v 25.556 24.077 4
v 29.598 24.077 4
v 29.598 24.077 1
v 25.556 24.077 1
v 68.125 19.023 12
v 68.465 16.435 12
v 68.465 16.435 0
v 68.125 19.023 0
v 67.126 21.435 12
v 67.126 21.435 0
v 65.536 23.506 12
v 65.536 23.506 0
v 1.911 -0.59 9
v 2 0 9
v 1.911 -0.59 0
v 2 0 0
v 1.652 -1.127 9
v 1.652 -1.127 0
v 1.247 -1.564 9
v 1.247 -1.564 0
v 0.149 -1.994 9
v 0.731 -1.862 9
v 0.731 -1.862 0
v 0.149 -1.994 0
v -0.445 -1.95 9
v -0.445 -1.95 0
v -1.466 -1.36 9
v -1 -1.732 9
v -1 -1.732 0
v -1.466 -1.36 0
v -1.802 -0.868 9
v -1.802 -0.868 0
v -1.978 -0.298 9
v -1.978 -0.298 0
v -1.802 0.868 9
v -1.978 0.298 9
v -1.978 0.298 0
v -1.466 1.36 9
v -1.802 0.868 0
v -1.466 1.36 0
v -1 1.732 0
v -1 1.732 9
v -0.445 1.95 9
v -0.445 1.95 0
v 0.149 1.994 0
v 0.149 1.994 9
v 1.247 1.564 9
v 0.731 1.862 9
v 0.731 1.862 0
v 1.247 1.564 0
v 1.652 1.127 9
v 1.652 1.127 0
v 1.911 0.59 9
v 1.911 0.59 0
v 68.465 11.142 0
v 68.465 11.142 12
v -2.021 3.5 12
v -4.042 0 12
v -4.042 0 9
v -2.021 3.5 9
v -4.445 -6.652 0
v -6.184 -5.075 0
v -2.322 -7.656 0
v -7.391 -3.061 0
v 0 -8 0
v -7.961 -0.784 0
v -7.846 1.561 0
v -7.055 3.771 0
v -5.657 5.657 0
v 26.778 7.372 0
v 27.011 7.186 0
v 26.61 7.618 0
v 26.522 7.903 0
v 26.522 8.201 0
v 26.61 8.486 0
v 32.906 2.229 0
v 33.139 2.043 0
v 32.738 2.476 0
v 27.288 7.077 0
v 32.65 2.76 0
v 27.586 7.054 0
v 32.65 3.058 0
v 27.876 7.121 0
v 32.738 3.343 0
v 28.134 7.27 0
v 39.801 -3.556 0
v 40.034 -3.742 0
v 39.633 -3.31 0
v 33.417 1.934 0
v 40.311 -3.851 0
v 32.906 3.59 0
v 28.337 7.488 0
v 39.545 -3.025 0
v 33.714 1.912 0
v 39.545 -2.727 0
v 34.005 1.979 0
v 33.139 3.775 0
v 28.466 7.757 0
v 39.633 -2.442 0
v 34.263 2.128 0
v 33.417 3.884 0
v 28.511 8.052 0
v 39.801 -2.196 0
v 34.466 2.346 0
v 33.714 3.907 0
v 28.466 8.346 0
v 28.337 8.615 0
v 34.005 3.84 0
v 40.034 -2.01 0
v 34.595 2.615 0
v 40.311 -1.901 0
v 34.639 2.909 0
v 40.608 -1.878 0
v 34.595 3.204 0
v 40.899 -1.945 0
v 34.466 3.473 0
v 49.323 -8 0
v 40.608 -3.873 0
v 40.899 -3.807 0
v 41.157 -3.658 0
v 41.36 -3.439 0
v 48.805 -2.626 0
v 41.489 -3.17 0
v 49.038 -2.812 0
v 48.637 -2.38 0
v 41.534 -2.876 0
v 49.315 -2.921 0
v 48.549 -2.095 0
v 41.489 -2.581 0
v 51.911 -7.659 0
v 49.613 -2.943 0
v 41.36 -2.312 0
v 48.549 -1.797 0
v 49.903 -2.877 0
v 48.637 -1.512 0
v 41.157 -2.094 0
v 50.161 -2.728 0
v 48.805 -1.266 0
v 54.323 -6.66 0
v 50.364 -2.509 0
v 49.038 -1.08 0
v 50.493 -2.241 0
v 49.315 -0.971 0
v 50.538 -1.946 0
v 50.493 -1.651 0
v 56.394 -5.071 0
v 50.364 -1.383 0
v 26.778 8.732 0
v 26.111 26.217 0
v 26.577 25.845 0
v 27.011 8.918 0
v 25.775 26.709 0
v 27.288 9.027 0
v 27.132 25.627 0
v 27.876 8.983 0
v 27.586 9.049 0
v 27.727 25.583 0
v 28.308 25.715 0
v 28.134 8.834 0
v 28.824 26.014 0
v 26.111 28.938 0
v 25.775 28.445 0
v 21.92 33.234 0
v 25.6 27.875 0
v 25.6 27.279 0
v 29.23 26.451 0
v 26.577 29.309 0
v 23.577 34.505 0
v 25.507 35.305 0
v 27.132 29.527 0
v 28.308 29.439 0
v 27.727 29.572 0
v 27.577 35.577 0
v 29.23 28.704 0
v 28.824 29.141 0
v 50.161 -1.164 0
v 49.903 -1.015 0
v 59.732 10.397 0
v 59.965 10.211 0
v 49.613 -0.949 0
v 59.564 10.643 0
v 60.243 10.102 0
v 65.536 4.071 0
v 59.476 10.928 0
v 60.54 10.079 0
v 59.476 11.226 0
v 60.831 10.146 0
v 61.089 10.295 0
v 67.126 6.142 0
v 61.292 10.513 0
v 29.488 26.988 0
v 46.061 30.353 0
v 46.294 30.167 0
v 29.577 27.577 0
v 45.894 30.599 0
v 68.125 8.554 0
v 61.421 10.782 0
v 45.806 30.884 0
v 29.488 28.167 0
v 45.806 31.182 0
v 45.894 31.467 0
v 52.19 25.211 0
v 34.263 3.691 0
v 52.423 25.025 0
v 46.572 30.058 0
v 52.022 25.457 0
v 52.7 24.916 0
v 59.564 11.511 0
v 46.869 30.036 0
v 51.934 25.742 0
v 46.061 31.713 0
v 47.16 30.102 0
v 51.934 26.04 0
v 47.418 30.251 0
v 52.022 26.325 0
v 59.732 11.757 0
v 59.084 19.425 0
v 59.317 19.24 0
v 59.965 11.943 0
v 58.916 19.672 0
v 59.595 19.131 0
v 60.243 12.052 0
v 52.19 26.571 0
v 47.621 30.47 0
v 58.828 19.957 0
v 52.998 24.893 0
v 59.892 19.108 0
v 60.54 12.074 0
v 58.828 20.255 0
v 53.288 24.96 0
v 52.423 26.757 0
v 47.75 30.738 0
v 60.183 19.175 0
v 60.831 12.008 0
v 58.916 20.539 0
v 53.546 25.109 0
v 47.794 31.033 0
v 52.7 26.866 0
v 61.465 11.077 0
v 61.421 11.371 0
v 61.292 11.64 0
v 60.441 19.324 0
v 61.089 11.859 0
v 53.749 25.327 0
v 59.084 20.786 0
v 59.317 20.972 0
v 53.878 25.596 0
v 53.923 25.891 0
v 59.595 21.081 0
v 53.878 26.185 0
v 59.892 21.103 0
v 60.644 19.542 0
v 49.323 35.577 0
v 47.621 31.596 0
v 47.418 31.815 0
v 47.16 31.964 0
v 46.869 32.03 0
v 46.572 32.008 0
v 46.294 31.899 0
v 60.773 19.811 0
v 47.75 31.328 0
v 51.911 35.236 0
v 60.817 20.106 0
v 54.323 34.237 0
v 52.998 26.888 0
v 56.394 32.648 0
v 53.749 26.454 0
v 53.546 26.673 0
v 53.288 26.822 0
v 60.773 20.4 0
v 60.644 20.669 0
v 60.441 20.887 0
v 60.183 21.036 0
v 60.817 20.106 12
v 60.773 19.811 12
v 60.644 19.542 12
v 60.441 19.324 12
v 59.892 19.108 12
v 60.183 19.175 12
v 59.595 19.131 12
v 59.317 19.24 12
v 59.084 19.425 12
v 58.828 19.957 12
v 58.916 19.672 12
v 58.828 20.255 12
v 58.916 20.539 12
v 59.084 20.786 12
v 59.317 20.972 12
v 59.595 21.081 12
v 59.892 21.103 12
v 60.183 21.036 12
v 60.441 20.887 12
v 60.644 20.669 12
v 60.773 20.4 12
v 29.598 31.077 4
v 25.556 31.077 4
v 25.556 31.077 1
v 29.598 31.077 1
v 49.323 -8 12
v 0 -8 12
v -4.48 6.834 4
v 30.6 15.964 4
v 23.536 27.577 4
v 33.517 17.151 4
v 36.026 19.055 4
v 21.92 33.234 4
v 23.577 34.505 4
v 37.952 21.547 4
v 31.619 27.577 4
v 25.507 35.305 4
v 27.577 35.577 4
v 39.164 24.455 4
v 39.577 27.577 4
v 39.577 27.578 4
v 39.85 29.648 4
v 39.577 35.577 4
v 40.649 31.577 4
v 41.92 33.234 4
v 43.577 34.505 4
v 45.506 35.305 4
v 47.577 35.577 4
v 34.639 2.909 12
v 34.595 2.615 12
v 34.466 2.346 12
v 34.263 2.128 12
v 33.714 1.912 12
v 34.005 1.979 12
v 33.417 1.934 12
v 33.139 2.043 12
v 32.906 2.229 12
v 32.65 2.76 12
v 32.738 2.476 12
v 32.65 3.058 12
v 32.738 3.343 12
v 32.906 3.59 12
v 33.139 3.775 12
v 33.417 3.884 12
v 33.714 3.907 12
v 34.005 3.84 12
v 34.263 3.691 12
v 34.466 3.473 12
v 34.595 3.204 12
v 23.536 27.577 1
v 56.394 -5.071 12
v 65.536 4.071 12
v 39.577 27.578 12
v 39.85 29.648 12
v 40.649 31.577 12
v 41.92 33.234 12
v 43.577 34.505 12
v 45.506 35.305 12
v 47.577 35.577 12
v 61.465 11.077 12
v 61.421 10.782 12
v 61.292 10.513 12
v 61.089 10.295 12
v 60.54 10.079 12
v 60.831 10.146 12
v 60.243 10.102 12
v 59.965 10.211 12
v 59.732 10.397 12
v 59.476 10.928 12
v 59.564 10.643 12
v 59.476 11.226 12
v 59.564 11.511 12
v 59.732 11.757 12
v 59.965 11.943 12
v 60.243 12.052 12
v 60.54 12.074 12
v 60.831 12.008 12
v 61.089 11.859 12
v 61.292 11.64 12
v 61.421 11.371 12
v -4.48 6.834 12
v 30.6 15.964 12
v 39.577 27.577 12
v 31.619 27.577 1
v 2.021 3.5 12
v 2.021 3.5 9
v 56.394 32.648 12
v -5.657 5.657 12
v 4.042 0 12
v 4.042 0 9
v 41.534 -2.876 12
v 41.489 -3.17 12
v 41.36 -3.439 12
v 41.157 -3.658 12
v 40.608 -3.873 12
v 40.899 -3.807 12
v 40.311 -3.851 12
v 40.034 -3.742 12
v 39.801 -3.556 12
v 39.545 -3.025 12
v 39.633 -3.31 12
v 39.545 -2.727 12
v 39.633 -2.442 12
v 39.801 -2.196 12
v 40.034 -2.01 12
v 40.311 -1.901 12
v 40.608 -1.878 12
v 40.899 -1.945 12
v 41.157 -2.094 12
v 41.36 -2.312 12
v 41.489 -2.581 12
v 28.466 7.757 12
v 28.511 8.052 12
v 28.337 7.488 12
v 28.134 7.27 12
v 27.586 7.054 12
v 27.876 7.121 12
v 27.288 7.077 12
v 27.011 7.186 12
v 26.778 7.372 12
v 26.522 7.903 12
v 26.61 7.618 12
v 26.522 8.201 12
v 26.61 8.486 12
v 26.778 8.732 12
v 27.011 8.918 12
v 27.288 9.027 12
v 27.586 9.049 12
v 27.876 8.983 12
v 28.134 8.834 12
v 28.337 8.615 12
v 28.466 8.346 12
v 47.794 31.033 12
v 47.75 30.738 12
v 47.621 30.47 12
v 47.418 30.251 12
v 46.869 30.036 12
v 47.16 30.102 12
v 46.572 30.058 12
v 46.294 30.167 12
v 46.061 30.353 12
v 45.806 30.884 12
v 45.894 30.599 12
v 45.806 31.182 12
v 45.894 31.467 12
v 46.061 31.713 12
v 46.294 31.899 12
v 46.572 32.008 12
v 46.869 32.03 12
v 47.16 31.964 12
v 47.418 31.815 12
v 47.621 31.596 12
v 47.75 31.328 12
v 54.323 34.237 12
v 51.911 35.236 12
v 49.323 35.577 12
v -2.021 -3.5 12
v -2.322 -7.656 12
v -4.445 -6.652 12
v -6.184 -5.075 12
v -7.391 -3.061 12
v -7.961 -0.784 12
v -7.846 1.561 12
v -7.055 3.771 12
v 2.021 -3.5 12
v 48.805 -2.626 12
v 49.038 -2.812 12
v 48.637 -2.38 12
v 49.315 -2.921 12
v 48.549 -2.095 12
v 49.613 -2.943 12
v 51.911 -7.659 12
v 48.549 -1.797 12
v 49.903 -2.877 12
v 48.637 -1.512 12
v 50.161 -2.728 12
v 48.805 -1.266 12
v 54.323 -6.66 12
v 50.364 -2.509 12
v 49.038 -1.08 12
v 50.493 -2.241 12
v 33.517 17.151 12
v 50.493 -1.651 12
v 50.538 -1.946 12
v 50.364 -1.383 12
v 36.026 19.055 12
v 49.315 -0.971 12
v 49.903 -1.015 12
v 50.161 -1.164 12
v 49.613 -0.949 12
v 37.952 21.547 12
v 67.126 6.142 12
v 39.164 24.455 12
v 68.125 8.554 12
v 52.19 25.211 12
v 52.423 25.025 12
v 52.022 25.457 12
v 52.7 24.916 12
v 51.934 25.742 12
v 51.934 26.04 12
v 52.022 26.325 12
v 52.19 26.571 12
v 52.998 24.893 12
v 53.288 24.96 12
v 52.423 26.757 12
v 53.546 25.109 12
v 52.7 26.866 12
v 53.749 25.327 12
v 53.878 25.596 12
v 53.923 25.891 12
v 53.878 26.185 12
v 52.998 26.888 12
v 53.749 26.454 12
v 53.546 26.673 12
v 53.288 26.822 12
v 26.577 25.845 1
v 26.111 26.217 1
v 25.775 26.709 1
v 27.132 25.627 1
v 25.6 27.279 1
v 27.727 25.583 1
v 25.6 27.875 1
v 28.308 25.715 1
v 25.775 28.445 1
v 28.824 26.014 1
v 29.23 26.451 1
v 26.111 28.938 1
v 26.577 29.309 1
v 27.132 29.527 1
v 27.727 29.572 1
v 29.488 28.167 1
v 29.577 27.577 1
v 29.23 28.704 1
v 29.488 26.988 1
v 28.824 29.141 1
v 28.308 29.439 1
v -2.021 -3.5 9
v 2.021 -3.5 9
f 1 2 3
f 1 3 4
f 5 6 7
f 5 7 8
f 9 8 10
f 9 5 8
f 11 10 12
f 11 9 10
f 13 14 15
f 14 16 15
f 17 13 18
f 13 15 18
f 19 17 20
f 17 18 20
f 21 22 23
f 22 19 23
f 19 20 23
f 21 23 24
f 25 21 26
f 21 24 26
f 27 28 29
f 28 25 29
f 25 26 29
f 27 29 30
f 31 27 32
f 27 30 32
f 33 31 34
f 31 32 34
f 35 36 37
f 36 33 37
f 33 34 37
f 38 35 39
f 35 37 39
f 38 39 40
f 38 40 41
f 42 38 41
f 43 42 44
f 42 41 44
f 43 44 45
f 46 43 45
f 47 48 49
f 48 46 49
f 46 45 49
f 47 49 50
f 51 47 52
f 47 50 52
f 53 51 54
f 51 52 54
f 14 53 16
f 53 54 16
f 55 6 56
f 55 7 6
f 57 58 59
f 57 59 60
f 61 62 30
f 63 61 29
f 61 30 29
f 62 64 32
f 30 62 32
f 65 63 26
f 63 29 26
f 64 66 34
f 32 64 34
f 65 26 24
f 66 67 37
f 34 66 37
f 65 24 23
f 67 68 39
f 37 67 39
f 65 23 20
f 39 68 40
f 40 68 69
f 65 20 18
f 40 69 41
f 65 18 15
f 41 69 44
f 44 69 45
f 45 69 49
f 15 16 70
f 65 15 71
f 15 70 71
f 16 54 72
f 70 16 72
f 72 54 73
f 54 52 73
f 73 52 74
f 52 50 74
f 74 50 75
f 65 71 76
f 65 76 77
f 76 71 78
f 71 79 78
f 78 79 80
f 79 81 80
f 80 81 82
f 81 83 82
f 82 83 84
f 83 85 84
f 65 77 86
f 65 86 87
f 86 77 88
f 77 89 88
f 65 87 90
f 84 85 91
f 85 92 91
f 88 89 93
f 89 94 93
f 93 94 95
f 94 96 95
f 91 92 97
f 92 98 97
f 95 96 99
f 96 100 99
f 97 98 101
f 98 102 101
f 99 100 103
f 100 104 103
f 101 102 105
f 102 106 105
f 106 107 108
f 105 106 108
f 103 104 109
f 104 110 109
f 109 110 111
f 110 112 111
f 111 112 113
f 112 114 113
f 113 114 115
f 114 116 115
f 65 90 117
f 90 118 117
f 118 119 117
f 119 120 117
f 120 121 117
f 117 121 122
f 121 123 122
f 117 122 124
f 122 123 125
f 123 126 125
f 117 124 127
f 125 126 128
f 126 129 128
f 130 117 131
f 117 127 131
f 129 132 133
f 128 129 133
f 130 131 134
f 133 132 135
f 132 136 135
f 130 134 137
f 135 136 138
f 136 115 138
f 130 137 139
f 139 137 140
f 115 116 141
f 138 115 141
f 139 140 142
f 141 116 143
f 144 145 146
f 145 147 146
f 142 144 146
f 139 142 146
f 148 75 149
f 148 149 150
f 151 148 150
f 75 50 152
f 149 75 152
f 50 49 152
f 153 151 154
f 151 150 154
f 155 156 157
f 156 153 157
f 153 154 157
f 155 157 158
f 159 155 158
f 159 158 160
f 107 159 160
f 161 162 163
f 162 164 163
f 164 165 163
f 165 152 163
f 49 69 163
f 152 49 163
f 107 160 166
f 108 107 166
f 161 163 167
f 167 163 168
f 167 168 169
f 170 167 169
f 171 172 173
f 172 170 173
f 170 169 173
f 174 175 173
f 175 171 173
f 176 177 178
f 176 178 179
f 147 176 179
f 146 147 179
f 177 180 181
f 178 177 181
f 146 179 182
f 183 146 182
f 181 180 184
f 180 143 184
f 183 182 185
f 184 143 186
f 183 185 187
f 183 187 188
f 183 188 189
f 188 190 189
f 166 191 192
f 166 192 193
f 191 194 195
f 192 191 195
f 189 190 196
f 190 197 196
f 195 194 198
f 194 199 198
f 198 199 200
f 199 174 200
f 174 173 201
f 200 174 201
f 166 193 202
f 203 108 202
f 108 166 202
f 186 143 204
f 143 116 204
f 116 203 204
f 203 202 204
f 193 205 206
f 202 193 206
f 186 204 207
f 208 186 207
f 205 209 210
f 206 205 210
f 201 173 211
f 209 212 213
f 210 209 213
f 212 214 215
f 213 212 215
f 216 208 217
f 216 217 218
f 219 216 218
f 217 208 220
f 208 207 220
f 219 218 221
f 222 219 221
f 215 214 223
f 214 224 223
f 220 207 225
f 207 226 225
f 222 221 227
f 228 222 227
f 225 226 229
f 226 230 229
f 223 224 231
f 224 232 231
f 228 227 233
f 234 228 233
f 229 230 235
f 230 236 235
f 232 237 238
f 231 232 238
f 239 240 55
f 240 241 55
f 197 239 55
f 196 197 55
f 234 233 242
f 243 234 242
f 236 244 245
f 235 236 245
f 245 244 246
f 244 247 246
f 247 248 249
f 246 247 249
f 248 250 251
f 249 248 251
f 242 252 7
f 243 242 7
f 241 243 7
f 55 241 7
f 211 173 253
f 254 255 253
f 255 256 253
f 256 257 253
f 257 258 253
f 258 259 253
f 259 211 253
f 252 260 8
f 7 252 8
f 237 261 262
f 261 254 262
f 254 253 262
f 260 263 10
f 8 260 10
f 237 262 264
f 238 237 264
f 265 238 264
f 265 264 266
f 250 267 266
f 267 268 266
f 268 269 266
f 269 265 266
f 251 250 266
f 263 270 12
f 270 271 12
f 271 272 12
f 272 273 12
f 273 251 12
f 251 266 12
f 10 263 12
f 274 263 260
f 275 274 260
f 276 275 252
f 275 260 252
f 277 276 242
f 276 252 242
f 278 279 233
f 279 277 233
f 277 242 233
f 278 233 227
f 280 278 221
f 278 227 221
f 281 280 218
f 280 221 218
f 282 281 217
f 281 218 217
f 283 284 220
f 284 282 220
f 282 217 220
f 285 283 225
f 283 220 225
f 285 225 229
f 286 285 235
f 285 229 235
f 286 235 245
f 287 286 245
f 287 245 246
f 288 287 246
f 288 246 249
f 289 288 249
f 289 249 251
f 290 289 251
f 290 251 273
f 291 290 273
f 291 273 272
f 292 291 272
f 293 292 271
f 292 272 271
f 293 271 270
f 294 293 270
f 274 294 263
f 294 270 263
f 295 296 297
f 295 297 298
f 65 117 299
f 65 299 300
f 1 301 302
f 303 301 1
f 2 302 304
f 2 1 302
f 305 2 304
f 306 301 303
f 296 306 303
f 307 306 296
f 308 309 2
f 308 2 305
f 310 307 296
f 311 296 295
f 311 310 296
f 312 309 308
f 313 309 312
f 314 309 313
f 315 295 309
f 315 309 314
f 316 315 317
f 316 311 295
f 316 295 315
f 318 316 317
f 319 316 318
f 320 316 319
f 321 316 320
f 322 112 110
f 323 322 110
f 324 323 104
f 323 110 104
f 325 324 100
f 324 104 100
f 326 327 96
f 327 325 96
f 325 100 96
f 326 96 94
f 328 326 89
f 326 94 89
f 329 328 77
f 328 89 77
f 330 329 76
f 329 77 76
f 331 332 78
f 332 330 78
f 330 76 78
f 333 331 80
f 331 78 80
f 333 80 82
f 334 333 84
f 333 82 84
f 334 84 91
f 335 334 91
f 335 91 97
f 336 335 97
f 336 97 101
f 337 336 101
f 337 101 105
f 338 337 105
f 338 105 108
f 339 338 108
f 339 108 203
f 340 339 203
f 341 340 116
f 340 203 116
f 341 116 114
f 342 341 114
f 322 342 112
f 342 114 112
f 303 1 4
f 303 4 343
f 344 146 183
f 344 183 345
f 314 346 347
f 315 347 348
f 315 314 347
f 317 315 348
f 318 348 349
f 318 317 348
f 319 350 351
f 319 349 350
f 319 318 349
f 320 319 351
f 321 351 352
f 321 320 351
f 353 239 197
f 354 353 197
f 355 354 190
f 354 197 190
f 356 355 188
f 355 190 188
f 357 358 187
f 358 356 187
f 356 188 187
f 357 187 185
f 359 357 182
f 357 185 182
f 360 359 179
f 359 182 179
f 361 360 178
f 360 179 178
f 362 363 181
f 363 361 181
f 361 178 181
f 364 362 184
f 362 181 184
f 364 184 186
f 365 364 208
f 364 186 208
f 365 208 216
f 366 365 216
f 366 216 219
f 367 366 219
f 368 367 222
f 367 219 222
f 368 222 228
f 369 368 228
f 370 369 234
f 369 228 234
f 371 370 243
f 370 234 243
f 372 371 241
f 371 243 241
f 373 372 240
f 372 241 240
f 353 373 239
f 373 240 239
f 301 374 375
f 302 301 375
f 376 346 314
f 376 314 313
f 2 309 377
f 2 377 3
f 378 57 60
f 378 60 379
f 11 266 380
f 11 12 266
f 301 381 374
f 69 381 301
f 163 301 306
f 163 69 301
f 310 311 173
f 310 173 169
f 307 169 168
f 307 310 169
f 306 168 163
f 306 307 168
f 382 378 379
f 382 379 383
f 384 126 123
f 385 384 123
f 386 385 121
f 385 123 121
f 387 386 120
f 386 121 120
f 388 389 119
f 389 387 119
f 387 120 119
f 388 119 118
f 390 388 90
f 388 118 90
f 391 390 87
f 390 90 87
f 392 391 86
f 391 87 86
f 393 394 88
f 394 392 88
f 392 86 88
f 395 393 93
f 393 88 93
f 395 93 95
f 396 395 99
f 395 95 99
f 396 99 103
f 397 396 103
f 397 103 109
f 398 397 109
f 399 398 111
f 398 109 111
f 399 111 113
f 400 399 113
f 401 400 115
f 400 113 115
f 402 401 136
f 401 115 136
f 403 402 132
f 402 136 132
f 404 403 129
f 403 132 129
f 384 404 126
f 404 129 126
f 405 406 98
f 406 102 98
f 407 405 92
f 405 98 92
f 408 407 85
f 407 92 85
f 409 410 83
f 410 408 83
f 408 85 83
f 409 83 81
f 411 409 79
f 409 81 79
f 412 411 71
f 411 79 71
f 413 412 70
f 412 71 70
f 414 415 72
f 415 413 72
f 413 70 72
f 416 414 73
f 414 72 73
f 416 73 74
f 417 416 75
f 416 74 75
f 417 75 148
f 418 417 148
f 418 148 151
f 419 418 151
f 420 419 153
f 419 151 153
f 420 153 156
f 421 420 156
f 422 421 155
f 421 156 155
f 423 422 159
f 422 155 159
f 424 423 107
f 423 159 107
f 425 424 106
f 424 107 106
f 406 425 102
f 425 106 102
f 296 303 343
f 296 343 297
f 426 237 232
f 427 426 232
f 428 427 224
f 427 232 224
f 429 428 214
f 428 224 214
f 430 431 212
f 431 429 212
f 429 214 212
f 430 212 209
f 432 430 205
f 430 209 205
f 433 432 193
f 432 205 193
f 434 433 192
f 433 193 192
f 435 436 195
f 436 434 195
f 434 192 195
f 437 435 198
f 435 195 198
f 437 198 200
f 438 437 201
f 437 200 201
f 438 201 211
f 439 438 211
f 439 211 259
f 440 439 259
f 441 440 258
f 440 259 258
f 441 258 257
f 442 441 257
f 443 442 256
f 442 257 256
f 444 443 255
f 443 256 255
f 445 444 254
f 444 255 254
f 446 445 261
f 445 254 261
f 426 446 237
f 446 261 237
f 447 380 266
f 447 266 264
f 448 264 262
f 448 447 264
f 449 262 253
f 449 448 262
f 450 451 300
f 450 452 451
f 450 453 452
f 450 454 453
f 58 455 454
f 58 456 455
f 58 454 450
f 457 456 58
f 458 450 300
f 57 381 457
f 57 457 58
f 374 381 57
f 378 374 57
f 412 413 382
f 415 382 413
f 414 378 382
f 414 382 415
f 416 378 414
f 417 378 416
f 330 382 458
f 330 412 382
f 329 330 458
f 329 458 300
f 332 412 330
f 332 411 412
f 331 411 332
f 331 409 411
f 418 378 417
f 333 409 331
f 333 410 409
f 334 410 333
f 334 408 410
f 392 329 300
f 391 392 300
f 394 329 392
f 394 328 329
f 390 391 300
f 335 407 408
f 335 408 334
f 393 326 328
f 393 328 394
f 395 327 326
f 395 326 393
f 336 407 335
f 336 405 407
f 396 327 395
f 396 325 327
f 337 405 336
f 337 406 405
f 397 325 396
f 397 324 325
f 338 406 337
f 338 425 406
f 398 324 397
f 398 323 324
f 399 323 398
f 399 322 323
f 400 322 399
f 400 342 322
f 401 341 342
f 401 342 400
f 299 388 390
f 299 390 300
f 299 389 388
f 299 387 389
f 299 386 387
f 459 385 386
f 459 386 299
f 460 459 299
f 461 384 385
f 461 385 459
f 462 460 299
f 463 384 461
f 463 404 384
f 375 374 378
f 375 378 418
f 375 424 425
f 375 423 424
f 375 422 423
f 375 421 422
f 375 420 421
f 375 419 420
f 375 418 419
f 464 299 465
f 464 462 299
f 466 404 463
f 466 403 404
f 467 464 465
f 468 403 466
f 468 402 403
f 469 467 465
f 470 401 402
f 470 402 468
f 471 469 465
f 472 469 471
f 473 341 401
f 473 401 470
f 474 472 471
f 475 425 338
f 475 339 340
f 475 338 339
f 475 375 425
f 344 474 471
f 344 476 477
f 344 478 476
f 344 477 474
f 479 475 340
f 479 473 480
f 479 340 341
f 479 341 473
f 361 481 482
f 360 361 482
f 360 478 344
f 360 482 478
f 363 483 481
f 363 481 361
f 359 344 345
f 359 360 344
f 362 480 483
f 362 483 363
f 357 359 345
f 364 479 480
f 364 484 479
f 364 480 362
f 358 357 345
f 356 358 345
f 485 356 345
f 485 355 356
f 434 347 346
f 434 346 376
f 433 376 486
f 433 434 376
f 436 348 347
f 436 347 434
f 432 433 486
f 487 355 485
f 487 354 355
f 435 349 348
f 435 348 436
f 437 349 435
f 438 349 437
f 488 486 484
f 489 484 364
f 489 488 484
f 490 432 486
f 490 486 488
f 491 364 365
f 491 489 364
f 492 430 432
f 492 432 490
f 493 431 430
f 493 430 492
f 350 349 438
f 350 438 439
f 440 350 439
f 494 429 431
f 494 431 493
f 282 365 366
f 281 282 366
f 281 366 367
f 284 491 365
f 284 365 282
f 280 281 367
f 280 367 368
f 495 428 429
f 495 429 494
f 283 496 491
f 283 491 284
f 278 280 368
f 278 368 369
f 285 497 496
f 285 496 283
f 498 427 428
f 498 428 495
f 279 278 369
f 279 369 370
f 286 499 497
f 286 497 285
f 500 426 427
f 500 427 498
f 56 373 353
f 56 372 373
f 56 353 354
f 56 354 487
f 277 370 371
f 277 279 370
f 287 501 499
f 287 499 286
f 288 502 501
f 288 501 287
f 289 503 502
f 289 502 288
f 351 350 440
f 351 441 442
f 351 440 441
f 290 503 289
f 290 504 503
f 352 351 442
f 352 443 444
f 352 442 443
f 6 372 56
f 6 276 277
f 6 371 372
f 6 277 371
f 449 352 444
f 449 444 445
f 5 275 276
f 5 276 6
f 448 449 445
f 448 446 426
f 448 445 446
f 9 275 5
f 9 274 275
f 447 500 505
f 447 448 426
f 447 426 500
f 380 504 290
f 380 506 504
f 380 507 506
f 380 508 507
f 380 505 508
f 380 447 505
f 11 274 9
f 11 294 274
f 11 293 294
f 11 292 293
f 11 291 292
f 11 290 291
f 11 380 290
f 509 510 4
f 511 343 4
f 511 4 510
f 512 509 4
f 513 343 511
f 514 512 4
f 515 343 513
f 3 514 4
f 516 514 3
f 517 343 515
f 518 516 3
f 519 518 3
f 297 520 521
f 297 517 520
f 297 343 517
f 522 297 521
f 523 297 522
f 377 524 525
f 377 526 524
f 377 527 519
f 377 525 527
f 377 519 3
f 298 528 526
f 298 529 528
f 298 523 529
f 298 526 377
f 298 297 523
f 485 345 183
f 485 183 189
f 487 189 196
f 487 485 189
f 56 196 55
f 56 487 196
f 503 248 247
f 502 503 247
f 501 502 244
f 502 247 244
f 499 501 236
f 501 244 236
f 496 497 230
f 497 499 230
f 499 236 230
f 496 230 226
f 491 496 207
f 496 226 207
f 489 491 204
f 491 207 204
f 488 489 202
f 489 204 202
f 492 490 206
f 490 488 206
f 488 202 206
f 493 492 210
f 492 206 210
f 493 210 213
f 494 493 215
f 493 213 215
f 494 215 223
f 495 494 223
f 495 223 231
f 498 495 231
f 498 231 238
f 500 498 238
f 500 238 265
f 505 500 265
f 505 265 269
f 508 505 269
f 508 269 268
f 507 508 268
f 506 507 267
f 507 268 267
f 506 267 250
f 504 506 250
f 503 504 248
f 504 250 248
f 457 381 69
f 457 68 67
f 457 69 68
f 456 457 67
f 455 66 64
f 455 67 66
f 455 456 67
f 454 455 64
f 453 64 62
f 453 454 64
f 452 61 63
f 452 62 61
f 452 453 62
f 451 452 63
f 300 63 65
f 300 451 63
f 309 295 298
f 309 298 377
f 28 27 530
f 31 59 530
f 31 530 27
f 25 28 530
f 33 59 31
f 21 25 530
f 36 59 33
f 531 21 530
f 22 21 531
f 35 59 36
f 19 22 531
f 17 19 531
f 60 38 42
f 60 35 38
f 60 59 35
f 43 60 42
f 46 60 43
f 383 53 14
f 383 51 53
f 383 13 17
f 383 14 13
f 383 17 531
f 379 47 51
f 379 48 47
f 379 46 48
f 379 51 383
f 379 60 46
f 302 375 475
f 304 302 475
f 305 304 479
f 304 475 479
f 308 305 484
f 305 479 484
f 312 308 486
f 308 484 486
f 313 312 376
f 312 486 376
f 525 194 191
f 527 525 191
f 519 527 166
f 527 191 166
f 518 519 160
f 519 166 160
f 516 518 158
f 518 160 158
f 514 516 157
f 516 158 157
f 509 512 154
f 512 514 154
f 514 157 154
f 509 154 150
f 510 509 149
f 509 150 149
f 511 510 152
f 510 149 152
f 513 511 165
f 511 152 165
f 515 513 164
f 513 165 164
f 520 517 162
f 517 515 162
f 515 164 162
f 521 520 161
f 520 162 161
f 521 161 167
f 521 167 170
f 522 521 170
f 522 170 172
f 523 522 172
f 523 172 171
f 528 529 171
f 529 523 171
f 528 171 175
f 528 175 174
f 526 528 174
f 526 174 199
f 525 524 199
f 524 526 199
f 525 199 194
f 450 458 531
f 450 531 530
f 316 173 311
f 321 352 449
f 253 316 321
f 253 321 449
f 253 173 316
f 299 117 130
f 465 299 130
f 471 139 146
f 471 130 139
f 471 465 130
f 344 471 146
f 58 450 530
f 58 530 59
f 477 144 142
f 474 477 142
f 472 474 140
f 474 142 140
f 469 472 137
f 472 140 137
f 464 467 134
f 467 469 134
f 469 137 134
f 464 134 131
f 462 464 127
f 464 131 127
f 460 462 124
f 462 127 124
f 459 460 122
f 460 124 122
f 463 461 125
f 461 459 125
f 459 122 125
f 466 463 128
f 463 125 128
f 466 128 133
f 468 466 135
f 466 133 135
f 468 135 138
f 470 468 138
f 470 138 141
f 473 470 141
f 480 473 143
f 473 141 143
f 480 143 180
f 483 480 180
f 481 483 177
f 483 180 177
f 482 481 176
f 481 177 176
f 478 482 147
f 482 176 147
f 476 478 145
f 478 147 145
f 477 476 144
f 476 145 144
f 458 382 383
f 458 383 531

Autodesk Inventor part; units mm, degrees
ref_plane "YZ Plane" through (0, 0, 0) normal (1, 0, 0) x (0, 1, 0)
ref_plane "XZ Plane" through (0, 0, 0) normal (0, 1, 0) x (-1, 0, 0)
ref_plane "XY Plane" through (0, 0, 0) normal (0, 0, 1) x (1, 0, 0)
sketch "Esquisse1" plane through (0, 0, 0) normal (0, 0, 1) x (1, 0, 0)
  line L0 (0, 0) -> (52, 0) construction
  line L1 (0, 0) -> (27.5772, 27.5772) construction
  circle A0 centre (27.5772, 27.5772) radius 2
  circle A1 centre (0, 0) radius 2
  line L2 (0, 0) -> (0, -8) construction
  line L3 (0, 0) -> (-5.6569, 5.6569) construction
  line L4 (68.4653, -8) -> (-19.3137, -8)
  line L5 (27.5772, 27.5772) -> (27.5772, 35.5772) construction
  line L6 (-19.3137, -8) -> (24.2635, 35.5772)
  line L7 (24.2635, 35.5772) -> (68.4653, 35.5772)
  line L8 (27.5772, 27.5772) -> (49, 27.5772) construction
  line L9 (27.5772, 27.5772) -> (55.0016, 4.5654) construction
  line L10 (27.5772, 27.5772) -> (37.219, 39.0678) construction
  line L11 (37.219, 39.0678) -> (41.8152, 35.2111) construction
  line L12 (41.8152, 35.2111) -> (46.7945, 31.033) construction
  line L13 (46.7945, 31.033) -> (52.9229, 25.8907) construction
  line L14 (52.9229, 25.8907) -> (59.8173, 20.1056) construction
  line L15 (55.0016, 4.5654) -> (60.4653, 11.0767) construction
  circle A2 centre (41.8152, 35.2111) radius 1 construction
  circle A3 centre (46.7945, 31.033) radius 1
  circle A4 centre (52.9229, 25.8907) radius 1
  circle A5 centre (59.8173, 20.1056) radius 1
  circle A6 centre (60.4653, 11.0767) radius 1
  circle A7 centre (22.5316, 12.2298) radius 1 construction
  circle A8 centre (27.5109, 8.0517) radius 1
  circle A9 centre (33.6393, 2.9094) radius 1
  circle A10 centre (40.5337, -2.8757) radius 1
  circle A11 centre (49.5379, -1.946) radius 1
  line L16 (60.4653, 11.0767) -> (68.4653, 11.0767) construction
  line L17 (68.4653, 35.5772) -> (68.4653, -8)
  dimension "d39" = 39
  dimension "d41" = 4
  dimension "d44" = 8
  dimension "d64" = 8
  dimension "d80" = 45
  dimension "d82" = 8
  dimension "d101" = 35.8
  dimension "d102" = 40
  dimension "d103" = 15
  dimension "d104" = 6
  dimension "d105" = 6.5
  dimension "d106" = 8
  dimension "d107" = 9
  dimension "d108" = 8.5
  dimension "d109" = 2
  dimension "d110" = 8
extrude "Extrusion15" add sketch "Esquisse1" along normal blind 12
sketch "Esquisse13" plane through (0, 0, 12) normal (0, 0, 1) x (1, 0, 0)
  circle A0 centre (0, 0) radius 2 projected
  circle A1 centre (27.5772, 27.5772) radius 2 projected
  line L0 (68.4653, -8) -> (68.4653, 35.5772) projected
  line L1 (68.4653, 35.5772) -> (24.2635, 35.5772) projected
  line L2 (24.2635, 35.5772) -> (-19.3137, -8) projected
  circle A2 centre (27.5772, 27.5772) radius 12 construction
  line L3 (39.5772, 35.5772) -> (39.5772, 27.5772)
  line L4 (0, 0) -> (0, 8) construction
  line L5 (-4.4796, 6.8341) -> (30.5997, 15.964)
  arc A3 (30.5997, 15.964) -> (39.5772, 27.5772) centre (27.5772, 27.5772) ccw
  dimension "d128" = 24
  dimension "d129" = 8
extrude "Extrusion16" cut sketch "Esquisse13" against normal blind 8 contours L3 A3 L5 L2 L1
sketch "Esquisse14" plane through (0, 0, 12) normal (0, 0, 1) x (1, 0, 0)
  line L0 (-19.3137, -8) -> (68.4653, -8) projected
  circle A0 centre (0, 0) radius 2 projected
  line L1 (4.0415, 0) -> (2.0207, -3.5)
  line L2 (2.0207, -3.5) -> (-2.0207, -3.5)
  line L3 (-2.0207, -3.5) -> (-4.0415, 0)
  line L4 (-4.0415, 0) -> (-2.0207, 3.5)
  line L5 (-2.0207, 3.5) -> (2.0207, 3.5)
  line L6 (2.0207, 3.5) -> (4.0415, 0)
  line L7 (2.0207, 3.5) -> (2.0207, -3.5) construction
  dimension "d132" = 7
sketch "Esquisse15" plane through (0, 0, 4) normal (0, 0, 1) x (1, 0, 0)
  circle A0 centre (27.5772, 27.5772) radius 2 projected
  arc A1 (30.5997, 15.964) -> (39.5772, 27.5772) centre (27.5772, 27.5772) ccw projected
  line L0 (31.6186, 27.5772) -> (29.5979, 24.0772)
  line L1 (29.5979, 24.0772) -> (25.5564, 24.0772)
  line L2 (25.5564, 24.0772) -> (23.5357, 27.5772)
  line L3 (23.5357, 27.5772) -> (25.5564, 31.0772)
  line L4 (25.5564, 31.0772) -> (29.5979, 31.0772)
  line L5 (29.5979, 31.0772) -> (31.6186, 27.5772)
  line L6 (-19.3137, -8) -> (68.4653, -8) projected
  line L7 (-2.0207, 3.5) -> (2.0207, 3.5) projected
  point P0 (0, 0)
extrude "Extrusion17" cut sketch "Esquisse14" against normal blind 3
extrude "Extrusion18" cut sketch "Esquisse15" against normal blind 3
fillet "Congé8" radius 8 1 edges at (-19.3137, -8, 6)
fillet "Congé9" radius 8 1 edges at (24.2635, 35.5772, 2)
fillet "Congé10" radius 8 1 edges at (39.5772, 35.5772, 8)
chamfer "Chanfrein1" distance 15 angle 45 1 edges at (68.4653, 35.5772, 6)
chamfer "Chanfrein2" distance 15 angle 45 1 edges at (68.4653, -8, 6)
fillet "Congé12" radius 10 1 edges at (53.4653, -8, 6)
fillet "Congé13" radius 10 1 edges at (68.4653, 7, 6)
fillet "Congé14" radius 10 1 edges at (68.4653, 20.5772, 6)
fillet "Congé15" radius 10 1 edges at (53.4653, 35.5772, 6)
properties part number "joint1+mx28imprint_v2"
